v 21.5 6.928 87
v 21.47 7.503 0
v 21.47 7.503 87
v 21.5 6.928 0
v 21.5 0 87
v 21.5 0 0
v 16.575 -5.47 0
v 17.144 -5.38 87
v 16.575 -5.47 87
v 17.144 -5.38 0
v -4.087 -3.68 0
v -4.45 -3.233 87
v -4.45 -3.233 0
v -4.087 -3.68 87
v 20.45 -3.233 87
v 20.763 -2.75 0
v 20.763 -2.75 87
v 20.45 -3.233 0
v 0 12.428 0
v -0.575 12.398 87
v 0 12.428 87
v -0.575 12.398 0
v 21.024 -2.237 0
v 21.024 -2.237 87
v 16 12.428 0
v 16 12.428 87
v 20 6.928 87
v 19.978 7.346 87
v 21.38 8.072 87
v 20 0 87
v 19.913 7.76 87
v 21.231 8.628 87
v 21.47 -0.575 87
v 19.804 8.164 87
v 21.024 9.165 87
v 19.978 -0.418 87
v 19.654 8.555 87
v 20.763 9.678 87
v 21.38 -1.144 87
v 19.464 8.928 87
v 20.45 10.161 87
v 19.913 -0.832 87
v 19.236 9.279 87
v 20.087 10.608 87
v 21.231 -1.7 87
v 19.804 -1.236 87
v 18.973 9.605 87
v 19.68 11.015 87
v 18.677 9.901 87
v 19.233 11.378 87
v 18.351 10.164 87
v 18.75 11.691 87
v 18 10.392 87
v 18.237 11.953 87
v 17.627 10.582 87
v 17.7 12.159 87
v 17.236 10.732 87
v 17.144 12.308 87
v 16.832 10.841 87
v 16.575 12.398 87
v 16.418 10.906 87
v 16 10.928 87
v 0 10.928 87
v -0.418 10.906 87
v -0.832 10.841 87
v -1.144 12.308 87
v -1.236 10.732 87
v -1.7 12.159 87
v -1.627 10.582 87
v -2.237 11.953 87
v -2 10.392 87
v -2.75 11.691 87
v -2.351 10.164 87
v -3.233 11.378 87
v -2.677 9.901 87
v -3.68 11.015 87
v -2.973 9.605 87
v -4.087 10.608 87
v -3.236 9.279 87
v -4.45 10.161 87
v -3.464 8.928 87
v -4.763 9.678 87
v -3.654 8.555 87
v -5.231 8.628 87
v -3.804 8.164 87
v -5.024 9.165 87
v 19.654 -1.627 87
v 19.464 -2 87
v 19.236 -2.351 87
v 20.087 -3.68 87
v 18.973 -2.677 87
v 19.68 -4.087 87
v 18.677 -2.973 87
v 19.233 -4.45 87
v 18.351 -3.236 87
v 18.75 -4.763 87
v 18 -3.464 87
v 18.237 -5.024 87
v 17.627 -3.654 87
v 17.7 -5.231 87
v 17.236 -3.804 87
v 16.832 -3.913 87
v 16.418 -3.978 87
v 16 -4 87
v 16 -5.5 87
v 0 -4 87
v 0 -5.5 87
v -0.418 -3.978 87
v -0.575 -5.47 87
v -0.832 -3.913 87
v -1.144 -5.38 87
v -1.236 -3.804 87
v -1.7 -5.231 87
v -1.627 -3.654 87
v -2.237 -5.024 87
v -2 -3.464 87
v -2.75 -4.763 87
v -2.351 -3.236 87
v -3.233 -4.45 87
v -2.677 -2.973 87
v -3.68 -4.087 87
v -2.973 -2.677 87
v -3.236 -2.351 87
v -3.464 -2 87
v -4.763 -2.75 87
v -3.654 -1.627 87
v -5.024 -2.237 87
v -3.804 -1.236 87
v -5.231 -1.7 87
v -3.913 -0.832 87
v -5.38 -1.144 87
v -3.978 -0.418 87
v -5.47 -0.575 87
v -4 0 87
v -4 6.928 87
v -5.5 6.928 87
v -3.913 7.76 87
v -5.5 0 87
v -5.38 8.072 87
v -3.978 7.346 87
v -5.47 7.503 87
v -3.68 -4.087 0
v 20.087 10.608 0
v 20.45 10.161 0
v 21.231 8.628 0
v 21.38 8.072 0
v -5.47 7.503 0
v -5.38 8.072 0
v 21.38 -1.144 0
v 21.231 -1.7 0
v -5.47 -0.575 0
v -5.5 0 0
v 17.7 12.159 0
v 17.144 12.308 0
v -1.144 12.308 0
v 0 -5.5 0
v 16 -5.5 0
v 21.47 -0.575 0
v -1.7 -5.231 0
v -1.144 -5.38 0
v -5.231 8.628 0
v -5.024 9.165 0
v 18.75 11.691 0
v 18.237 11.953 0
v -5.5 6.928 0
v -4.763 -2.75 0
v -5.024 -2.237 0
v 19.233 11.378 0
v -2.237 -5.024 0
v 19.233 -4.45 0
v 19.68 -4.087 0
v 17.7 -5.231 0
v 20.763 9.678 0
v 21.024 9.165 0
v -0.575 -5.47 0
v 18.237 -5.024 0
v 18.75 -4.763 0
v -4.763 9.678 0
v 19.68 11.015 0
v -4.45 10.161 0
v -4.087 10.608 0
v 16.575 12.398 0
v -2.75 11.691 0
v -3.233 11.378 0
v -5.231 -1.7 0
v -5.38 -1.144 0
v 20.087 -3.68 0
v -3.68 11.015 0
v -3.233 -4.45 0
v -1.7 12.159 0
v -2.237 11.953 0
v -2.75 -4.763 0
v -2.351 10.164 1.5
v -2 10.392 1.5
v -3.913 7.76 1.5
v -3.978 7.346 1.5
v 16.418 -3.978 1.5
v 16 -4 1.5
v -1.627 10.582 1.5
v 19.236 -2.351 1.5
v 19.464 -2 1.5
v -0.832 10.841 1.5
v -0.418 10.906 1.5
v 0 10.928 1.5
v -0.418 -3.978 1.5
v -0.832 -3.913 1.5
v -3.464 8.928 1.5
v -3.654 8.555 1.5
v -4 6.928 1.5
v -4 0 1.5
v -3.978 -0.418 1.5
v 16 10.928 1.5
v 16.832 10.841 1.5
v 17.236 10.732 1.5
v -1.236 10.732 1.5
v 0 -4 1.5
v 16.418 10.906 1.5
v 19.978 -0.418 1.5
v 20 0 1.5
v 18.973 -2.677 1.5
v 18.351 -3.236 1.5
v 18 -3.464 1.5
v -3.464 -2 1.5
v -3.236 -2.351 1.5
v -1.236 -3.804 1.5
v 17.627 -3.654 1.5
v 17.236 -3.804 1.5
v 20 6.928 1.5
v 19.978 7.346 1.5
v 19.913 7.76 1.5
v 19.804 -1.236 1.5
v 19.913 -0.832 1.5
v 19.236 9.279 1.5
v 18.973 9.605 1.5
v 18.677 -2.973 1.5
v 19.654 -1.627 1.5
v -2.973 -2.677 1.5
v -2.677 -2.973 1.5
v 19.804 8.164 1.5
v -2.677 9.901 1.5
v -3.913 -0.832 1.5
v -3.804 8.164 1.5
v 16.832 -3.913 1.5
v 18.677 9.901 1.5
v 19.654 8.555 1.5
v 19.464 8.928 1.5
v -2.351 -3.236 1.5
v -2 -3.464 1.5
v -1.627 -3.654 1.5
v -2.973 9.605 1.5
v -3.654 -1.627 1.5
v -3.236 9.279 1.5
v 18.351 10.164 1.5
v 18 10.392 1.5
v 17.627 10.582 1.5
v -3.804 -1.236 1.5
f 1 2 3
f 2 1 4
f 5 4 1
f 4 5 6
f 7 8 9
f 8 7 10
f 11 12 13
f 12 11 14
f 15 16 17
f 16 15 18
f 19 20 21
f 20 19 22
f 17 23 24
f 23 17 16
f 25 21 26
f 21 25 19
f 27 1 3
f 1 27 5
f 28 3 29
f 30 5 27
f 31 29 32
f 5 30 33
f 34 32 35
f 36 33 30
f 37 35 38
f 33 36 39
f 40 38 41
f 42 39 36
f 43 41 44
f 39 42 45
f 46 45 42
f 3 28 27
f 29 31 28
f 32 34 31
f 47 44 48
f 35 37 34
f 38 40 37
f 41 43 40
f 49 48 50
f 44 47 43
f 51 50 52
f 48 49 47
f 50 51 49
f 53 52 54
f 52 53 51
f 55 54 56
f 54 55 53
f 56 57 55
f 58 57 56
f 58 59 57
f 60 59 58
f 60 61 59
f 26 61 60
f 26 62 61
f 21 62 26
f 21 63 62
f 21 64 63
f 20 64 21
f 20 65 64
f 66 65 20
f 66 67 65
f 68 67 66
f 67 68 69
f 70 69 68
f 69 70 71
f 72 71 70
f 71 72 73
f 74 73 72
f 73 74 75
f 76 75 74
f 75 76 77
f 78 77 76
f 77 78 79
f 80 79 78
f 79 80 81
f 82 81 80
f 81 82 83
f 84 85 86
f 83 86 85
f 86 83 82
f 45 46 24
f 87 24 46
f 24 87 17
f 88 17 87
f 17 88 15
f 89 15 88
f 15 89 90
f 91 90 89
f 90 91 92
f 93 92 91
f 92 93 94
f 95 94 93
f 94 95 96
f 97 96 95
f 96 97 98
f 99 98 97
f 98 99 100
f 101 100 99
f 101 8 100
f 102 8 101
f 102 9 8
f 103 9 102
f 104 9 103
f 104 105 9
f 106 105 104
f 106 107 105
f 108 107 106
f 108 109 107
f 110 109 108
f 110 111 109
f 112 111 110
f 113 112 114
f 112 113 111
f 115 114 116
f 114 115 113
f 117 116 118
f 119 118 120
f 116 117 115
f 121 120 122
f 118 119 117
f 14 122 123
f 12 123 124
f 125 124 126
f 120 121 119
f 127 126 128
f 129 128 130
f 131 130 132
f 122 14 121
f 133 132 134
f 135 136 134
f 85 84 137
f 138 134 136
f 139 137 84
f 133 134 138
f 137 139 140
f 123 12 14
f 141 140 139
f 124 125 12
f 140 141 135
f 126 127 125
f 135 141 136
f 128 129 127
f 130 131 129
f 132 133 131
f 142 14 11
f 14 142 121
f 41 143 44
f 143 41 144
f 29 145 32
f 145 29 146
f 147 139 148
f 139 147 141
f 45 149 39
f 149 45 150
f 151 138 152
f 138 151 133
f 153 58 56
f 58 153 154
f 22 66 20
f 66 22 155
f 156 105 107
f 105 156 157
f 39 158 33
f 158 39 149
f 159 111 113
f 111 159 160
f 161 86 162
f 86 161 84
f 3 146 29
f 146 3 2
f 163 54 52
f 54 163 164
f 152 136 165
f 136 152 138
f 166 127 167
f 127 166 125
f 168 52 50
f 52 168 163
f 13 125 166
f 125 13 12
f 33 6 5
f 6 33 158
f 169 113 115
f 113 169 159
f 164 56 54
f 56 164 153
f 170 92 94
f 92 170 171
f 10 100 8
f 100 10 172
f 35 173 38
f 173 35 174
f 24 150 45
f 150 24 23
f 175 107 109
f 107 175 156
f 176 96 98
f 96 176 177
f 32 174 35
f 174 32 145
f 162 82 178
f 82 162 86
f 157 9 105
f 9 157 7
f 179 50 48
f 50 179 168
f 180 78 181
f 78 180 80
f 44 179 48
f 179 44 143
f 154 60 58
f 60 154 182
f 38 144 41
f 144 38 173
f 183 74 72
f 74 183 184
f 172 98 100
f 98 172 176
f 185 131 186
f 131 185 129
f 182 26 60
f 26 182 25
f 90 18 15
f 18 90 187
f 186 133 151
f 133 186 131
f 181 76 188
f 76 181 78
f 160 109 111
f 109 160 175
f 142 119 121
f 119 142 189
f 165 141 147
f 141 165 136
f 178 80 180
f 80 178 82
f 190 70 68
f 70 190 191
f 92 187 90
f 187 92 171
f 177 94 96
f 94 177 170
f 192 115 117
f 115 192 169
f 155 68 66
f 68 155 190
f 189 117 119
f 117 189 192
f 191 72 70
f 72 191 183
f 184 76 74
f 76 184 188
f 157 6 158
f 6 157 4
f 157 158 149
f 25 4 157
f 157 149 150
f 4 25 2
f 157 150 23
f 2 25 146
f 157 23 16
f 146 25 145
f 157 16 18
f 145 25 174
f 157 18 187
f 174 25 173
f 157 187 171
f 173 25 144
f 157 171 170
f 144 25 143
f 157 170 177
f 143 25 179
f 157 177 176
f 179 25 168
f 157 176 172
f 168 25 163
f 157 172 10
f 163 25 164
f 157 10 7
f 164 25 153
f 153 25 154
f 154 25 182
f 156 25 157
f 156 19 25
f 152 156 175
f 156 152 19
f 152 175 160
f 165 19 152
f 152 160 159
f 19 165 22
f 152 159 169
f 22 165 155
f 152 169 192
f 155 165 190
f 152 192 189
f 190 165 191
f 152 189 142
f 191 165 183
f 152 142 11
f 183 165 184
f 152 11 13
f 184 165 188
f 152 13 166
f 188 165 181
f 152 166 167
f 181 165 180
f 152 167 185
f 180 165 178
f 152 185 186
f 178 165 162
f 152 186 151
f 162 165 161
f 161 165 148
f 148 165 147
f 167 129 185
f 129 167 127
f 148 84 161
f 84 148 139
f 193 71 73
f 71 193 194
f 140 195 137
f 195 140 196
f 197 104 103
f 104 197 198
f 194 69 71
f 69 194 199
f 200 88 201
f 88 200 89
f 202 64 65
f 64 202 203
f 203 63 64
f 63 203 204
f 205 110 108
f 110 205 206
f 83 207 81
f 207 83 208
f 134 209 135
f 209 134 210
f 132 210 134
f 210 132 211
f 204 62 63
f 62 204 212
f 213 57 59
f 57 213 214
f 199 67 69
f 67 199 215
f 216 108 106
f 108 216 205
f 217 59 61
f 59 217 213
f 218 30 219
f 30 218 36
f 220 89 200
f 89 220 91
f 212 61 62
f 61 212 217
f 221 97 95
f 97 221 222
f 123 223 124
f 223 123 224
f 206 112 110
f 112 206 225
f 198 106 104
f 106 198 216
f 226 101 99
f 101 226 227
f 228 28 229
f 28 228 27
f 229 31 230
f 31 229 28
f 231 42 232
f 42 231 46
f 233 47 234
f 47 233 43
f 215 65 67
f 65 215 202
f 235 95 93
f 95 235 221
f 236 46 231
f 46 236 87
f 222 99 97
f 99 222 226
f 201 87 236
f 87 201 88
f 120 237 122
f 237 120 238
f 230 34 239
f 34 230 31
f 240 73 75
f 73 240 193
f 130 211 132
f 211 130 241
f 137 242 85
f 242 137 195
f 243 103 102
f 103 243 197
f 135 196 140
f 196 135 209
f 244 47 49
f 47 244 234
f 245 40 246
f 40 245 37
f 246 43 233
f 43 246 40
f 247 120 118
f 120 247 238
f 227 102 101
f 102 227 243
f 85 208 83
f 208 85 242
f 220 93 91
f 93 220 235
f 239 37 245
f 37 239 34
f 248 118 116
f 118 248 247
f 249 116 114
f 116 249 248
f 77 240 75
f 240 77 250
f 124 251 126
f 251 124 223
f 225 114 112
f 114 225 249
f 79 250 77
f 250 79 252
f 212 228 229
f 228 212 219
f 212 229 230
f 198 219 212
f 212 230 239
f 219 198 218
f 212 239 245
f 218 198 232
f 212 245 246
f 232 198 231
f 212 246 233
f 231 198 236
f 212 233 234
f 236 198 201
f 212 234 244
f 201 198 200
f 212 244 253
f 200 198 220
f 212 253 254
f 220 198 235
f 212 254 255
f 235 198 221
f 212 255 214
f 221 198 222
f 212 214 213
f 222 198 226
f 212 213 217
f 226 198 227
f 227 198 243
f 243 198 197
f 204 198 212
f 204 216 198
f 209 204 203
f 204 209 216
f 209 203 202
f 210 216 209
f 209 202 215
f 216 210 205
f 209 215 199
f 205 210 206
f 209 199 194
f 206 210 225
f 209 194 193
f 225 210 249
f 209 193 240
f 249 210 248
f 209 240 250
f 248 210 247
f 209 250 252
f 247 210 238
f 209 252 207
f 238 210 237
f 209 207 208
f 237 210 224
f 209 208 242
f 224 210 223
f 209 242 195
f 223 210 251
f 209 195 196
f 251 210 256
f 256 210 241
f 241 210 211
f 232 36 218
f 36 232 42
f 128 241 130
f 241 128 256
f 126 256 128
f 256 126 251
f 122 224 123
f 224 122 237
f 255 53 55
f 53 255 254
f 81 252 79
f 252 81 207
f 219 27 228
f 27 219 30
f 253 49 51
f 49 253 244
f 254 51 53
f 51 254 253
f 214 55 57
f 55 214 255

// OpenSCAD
$fn=60;

difference(){
minkowski(){
cylinder(d=11,h=2);
cube([16,8*sqrt(3)/2,85]);
}
translate([0,0,1.5])
minkowski(){
cylinder(d=8,h=1);
cube([16,8*sqrt(3)/2,85]);
}
}
